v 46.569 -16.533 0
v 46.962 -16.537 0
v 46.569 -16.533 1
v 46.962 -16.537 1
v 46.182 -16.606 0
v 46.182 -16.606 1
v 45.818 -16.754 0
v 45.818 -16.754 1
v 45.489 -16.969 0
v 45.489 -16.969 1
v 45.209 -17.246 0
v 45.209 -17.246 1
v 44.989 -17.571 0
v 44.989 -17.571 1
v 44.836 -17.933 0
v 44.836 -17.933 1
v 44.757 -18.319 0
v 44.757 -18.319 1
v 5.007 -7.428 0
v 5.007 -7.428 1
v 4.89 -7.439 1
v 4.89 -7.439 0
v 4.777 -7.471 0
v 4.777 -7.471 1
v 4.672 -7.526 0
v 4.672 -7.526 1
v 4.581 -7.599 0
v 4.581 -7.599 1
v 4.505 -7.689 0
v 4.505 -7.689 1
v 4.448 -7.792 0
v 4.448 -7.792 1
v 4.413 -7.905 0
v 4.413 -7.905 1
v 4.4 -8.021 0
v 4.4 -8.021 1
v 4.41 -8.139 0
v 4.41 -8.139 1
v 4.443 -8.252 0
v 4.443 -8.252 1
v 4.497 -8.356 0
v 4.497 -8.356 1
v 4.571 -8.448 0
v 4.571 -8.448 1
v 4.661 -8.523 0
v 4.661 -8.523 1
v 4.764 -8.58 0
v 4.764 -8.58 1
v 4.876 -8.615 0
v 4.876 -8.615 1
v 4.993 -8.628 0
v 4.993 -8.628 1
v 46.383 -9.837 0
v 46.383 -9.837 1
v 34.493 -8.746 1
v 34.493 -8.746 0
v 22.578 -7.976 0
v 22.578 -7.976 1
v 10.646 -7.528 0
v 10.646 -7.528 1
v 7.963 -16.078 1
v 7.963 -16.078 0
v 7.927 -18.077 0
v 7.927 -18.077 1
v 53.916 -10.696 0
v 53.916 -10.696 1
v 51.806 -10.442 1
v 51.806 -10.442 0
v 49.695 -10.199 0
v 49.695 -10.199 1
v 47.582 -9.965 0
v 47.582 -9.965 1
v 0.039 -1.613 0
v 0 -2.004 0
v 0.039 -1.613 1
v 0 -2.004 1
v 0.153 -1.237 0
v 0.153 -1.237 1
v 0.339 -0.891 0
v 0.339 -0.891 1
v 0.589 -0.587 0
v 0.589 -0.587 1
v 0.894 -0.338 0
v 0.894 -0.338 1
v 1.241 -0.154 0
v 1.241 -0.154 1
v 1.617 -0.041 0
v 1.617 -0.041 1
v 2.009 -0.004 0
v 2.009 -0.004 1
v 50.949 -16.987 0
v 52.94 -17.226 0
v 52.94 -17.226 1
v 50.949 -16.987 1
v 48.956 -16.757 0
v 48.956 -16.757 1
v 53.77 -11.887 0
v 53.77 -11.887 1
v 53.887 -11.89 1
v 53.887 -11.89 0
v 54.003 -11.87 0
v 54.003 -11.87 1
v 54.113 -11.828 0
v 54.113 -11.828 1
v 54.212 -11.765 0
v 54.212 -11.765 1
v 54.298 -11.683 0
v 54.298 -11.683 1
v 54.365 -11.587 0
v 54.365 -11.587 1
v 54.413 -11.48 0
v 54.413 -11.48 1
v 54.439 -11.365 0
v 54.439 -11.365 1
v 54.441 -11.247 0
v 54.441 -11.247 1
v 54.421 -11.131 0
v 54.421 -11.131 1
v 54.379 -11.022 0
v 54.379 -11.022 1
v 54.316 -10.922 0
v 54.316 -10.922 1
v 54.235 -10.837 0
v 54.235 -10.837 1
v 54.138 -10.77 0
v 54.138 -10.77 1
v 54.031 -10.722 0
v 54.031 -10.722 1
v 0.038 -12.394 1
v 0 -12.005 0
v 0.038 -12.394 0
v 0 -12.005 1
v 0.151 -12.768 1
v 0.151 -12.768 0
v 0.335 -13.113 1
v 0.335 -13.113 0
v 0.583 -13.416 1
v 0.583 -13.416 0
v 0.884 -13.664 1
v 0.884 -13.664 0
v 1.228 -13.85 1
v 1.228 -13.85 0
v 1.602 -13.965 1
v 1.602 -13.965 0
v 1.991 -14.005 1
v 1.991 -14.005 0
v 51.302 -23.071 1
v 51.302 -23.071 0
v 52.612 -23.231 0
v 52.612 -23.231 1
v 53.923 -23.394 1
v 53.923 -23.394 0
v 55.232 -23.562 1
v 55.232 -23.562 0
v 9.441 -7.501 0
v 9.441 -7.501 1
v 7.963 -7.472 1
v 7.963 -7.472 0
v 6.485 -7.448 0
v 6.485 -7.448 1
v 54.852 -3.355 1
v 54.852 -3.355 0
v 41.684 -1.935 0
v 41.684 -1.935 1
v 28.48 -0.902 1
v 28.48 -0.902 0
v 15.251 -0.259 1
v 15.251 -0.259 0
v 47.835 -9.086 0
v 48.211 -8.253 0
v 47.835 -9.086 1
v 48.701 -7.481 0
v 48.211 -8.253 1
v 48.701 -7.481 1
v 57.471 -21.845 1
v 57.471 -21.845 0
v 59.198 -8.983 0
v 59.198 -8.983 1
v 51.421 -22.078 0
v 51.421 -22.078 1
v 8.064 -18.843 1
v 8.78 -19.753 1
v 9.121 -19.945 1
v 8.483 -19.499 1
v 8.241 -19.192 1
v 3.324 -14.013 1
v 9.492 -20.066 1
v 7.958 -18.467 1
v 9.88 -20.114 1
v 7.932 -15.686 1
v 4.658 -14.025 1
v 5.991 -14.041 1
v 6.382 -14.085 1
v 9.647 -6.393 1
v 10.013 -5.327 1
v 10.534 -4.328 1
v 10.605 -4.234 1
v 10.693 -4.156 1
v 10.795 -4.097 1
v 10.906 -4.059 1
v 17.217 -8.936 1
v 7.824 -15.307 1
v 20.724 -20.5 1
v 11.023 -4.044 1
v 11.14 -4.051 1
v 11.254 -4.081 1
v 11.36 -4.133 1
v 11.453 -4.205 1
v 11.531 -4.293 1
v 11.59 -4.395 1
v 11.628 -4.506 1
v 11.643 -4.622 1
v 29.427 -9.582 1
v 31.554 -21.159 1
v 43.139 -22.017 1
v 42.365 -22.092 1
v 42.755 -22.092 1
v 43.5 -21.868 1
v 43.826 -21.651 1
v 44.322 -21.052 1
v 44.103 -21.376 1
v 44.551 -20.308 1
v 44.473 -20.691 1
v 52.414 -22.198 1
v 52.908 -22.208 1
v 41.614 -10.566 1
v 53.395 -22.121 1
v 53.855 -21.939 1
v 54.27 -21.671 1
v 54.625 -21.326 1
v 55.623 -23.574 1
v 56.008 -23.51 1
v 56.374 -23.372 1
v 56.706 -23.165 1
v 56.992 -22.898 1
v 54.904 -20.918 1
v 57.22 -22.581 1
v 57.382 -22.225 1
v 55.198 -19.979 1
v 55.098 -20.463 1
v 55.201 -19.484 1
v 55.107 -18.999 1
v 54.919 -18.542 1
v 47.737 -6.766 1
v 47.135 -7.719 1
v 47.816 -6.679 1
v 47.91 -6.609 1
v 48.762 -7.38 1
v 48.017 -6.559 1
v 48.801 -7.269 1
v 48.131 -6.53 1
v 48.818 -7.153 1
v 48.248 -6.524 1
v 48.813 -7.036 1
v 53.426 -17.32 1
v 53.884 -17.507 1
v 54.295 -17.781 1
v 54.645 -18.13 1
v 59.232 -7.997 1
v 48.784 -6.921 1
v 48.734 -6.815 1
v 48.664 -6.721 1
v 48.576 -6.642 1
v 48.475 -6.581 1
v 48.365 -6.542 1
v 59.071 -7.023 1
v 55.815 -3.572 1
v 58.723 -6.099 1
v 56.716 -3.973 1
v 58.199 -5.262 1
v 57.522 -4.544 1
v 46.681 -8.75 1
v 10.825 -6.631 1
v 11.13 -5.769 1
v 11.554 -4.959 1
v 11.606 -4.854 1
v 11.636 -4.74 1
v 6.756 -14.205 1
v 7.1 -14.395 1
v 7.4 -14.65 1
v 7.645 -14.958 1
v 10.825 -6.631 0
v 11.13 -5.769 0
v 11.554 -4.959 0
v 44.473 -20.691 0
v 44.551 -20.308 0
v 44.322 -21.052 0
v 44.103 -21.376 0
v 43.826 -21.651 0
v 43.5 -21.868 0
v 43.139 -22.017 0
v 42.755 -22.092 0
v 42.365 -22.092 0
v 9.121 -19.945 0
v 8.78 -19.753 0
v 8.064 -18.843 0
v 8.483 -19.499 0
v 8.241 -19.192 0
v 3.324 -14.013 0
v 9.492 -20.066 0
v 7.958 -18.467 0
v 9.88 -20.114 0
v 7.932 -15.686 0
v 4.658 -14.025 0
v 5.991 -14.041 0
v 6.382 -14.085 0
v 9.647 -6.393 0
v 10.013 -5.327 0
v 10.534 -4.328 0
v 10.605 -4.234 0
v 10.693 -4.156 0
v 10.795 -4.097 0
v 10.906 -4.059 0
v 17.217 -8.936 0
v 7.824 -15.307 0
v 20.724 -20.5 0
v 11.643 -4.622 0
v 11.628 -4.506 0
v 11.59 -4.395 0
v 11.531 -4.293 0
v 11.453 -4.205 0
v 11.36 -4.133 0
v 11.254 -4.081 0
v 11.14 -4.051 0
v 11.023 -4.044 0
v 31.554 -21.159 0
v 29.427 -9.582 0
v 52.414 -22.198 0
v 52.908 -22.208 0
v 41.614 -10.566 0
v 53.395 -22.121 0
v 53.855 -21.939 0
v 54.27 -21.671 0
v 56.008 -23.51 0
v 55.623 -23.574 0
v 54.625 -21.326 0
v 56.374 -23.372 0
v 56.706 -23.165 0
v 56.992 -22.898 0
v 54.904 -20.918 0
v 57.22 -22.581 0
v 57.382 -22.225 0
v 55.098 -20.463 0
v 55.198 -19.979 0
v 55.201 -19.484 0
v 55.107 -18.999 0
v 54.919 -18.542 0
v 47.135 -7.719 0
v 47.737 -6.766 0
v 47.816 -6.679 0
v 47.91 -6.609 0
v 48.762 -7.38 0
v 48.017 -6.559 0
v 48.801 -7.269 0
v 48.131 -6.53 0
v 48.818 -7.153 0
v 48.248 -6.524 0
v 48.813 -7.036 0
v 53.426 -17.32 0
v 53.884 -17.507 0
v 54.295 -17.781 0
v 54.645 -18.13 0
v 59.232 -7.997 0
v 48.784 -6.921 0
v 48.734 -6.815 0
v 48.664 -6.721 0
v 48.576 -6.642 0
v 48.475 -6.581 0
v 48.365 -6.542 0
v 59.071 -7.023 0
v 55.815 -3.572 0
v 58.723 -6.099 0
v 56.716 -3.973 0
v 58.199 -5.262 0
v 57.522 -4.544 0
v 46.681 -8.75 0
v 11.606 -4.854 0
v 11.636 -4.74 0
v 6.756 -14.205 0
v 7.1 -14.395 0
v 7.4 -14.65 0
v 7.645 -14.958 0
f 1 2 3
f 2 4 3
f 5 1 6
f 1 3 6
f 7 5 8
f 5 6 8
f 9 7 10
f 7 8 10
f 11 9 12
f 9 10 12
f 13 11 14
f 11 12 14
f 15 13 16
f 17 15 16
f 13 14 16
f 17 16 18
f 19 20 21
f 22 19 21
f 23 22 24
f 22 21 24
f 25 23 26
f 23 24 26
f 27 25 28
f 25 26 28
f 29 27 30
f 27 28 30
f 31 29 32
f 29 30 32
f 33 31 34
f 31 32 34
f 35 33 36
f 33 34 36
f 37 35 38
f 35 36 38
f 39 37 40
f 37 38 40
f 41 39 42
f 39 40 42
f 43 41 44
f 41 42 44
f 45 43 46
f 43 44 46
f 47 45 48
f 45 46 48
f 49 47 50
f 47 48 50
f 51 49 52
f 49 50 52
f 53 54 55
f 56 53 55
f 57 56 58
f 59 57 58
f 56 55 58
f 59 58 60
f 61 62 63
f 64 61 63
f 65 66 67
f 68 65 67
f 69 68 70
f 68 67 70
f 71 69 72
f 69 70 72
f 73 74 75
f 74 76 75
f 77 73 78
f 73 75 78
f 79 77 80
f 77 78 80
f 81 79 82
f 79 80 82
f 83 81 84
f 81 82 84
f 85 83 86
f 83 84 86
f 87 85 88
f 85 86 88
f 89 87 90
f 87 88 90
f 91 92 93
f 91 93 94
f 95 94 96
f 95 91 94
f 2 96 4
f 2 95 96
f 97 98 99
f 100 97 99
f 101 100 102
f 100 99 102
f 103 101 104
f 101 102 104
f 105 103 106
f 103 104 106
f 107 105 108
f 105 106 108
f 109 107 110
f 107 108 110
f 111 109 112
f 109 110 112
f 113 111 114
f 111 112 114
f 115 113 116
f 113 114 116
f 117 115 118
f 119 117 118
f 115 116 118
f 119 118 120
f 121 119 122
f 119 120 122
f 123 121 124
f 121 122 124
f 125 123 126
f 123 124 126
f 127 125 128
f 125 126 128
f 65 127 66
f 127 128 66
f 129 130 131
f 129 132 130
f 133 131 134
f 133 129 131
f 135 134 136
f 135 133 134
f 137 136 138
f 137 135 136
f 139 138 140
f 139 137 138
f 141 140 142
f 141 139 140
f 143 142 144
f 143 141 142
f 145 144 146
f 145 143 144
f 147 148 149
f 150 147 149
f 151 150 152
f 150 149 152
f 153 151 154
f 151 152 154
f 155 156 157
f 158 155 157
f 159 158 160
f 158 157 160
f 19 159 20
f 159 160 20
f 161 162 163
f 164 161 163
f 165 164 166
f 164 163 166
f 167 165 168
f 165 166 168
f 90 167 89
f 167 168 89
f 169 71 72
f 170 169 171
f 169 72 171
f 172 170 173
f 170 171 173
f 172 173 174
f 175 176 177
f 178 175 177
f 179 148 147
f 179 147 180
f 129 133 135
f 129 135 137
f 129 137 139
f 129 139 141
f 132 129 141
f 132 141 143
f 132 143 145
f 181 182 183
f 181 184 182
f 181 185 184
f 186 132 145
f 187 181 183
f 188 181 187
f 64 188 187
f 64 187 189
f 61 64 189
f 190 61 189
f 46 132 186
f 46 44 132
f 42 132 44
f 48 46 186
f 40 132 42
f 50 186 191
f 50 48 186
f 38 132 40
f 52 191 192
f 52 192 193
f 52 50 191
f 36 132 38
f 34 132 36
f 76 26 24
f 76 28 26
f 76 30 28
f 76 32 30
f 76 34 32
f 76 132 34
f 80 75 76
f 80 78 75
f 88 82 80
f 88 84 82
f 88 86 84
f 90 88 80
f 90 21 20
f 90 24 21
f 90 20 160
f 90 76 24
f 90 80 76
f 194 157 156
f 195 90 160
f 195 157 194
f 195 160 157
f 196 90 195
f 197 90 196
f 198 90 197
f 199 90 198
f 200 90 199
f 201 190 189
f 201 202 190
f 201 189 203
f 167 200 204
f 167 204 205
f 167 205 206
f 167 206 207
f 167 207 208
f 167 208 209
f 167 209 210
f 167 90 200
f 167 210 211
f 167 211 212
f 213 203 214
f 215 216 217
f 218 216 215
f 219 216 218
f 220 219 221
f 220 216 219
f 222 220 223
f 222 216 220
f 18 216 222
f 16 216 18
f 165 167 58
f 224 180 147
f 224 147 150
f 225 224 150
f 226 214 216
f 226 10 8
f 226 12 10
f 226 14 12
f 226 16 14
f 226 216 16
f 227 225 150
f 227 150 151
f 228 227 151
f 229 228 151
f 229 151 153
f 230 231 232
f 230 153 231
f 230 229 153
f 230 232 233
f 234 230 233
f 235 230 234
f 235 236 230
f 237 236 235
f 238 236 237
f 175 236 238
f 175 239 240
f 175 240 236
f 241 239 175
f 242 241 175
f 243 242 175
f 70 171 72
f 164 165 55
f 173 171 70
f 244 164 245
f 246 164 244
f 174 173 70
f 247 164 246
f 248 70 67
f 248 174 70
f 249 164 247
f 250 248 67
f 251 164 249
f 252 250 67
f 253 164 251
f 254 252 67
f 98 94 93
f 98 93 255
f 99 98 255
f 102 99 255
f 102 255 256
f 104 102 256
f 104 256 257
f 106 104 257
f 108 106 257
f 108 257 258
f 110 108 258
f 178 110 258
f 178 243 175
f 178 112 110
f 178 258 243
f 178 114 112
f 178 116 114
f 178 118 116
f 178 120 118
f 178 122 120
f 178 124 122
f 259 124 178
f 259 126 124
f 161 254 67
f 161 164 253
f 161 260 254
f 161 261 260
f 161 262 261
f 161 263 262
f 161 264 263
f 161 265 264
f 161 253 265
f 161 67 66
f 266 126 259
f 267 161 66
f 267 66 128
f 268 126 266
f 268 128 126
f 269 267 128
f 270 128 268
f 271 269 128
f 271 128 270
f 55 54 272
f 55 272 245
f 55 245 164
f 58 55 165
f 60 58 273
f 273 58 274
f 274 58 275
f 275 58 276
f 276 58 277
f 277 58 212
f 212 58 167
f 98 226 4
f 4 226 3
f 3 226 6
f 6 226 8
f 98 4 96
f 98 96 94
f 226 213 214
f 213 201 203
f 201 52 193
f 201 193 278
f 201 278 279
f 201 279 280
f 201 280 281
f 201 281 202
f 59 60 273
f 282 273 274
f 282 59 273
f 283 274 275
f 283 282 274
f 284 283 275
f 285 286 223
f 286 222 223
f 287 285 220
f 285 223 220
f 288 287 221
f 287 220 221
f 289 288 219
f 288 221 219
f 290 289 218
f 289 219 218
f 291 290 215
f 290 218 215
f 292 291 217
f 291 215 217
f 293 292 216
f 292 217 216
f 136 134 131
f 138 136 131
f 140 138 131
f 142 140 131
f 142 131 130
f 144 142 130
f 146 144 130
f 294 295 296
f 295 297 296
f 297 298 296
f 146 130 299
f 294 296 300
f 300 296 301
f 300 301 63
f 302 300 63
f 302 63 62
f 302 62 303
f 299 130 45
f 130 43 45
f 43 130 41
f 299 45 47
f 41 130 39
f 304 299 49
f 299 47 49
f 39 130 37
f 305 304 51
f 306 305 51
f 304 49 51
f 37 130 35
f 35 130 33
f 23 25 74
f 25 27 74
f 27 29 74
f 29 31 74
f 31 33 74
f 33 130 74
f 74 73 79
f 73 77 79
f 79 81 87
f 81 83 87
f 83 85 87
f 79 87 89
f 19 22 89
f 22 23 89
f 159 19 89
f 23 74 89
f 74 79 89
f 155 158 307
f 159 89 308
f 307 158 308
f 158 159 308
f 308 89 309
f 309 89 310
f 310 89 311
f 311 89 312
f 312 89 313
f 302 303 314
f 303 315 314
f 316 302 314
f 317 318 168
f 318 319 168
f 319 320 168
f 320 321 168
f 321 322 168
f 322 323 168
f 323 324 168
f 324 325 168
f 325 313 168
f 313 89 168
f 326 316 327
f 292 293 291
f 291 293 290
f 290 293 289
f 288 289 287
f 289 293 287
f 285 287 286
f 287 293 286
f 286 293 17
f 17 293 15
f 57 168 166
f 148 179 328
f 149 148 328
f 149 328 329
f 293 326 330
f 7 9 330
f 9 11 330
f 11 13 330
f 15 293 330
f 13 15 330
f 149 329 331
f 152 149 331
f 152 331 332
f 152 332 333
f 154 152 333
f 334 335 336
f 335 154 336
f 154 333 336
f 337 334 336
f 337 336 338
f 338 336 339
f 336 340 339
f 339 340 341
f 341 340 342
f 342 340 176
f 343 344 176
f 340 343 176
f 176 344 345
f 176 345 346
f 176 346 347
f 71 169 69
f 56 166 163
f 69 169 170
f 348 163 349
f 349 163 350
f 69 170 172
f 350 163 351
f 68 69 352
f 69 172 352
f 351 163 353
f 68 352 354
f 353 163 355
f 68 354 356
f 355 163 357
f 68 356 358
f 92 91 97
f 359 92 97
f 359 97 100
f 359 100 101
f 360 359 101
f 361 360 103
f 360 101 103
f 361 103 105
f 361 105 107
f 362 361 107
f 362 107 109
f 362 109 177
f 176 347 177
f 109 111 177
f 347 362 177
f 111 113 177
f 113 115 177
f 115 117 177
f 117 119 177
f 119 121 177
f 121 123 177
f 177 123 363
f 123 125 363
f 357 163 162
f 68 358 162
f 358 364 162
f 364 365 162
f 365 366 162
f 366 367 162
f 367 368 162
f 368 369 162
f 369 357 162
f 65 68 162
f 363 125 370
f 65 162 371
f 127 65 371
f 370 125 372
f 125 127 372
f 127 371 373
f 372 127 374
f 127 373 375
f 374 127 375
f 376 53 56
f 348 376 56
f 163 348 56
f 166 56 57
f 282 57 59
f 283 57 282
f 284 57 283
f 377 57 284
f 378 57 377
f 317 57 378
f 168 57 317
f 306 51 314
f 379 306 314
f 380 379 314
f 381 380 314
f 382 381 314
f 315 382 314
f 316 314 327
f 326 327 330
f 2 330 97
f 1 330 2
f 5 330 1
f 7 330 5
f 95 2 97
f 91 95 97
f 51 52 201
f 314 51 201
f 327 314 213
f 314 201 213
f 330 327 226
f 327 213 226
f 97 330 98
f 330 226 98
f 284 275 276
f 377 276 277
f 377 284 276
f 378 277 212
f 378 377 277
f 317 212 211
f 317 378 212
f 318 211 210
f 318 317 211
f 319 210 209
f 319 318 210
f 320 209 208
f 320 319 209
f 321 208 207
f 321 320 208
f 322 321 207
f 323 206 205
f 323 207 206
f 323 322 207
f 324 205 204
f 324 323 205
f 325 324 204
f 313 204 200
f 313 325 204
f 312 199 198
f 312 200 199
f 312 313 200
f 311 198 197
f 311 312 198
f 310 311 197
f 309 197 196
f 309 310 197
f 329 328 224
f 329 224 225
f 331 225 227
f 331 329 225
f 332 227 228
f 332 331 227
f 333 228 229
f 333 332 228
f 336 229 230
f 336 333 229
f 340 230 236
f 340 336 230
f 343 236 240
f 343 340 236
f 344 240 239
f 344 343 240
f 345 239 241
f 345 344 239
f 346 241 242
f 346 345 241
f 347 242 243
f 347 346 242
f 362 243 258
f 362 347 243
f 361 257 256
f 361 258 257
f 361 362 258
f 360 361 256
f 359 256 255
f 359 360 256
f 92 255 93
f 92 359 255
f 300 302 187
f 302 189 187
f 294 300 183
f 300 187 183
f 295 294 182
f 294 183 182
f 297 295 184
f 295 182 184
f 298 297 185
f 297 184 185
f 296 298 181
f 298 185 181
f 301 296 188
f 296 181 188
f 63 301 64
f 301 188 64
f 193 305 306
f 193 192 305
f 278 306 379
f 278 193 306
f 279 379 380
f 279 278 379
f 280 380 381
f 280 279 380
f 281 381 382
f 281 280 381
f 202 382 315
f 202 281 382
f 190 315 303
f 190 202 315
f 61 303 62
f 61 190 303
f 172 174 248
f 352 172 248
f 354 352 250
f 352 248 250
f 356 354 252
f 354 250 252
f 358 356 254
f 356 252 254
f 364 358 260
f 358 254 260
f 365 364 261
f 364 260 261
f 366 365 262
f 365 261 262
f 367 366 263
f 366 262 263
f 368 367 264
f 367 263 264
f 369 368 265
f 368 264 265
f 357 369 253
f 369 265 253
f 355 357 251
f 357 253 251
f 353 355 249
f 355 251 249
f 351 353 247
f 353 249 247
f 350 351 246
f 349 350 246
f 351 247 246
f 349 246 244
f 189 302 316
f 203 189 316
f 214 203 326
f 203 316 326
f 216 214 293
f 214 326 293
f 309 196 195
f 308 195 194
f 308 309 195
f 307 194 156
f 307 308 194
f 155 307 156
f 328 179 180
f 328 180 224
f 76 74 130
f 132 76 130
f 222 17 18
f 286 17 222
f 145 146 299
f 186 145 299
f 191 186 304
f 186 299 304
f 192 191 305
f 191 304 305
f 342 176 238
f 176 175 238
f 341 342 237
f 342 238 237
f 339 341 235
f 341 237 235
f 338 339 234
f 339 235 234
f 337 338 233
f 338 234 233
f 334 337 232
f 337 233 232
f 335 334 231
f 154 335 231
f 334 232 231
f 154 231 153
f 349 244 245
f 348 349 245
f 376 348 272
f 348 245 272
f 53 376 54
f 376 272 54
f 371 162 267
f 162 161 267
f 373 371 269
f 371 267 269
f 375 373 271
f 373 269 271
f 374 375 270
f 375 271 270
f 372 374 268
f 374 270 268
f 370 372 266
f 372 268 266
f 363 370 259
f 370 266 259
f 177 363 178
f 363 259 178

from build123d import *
from OCP.BRepFilletAPI import BRepFilletAPI_MakeFillet

# Parameters (mm, degrees)
P_IDAT_VYSUNUT_M1_DEPTH       = 1
ODEBRAT_VYSUNUT_M1_DEPTH      = 65.439881064
ODEBRAT_VYSUNUT_M3_DEPTH      = 65.439881064
ODEBRAT_VYSUNUT_M3_DEPTH_BACK = 65.439881064
ODEBRAT_VYSUNUT_M4_DEPTH      = 65.439881064
ODEBRAT_VYSUNUT_M4_DEPTH_BACK = 65.439881064
ZAOBLIT1_R1                   = 2
ZAOBLIT1_R2                   = 5
ODEBRAT_VYSUNUT_M5_DEPTH      = 64.769631591
ODEBRAT_VYSUNUT_M8_DEPTH      = 64.769631591


with BuildPart() as part:
    # Skica1 → Přidat vysunutím1 (new body)
    with BuildSketch(Plane.XY):
        with BuildLine():
            Line((0, 0), (0, -20))
            ThreePointArc((0, -20), (28.666666667, -20.95661965), (57.205784047, -23.822222222))
            Line((57.205784047, -23.822222222), (59.866518188, -4))
            ThreePointArc((59.866518188, -4), (30, -1.001113587), (0, 0))
        make_face()
    extrude(amount=P_IDAT_VYSUNUT_M1_DEPTH)

    # Skica2 → Odebrat vysunutím1 (cut, through all)
    with BuildSketch(Plane.XY.offset(1)):
        with BuildLine():
            ThreePointArc((5.00678733, -7.428319839), (4.400038391, -8.021494117), (4.99321267, -8.628243057))
            ThreePointArc((4.99321267, -8.628243057), (29.426706516, -9.581983857), (53.769895868, -11.887276722))
            ThreePointArc((53.769895868, -11.887276722), (54.438517462, -11.36483518), (53.916075921, -10.696213586))
            ThreePointArc((53.916075921, -10.696213586), (29.506706624, -8.3846535), (5.00678733, -7.428319839))
        make_face()
    extrude(amount=-ODEBRAT_VYSUNUT_M1_DEPTH, mode=Mode.SUBTRACT)

    # Skica4 → Odebrat vysunutím3 (cut, two sides: drawn at the far end of the back side and taken through both)
    with BuildSketch(Plane.XY.offset(1).offset(-ODEBRAT_VYSUNUT_M3_DEPTH_BACK)):
        with BuildLine():
            Line((-132.963409192, -14), (0, -14))
            ThreePointArc((0, -14), (4.000168361, -14.018350555), (8, -14.073400674))
            Line((8, -14.073400674), (7.889908257, -20.072390573))
            Line((7.889908257, -20.072390573), (5.450212675, -153.013415352))
            Line((5.450212675, -153.013415352), (-182.994540511, -340.645096397))
            Line((-182.994540511, -340.645096397), (-321.408162378, -201.631681045))
            Line((-321.408162378, -201.631681045), (-132.963409192, -14))
        make_face()
    extrude(amount=ODEBRAT_VYSUNUT_M3_DEPTH + ODEBRAT_VYSUNUT_M3_DEPTH_BACK, mode=Mode.SUBTRACT)

    # Skica5 → Odebrat vysunutím4 (cut, two sides: drawn at the far end of the back side and taken through both)
    with BuildSketch(Plane.XY.offset(1).offset(-ODEBRAT_VYSUNUT_M4_DEPTH_BACK)):
        with BuildLine():
            Line((36.686520611, -144.697920219), (51.301744348, -23.071281094))
            Line((51.301744348, -23.071281094), (51.42105073, -22.078423608))
            Line((51.42105073, -22.078423608), (52.413908216, -22.19772999))
            ThreePointArc((52.413908216, -22.19772999), (55.198271053, -19.978877549), (52.940438573, -17.226029013))
            ThreePointArc((52.940438573, -17.226029013), (48.954265765, -16.757019834), (44.963944364, -16.324725506))
            Line((44.963944364, -16.324725506), (44.345174487, -22.292733871))
            Line((44.345174487, -22.292733871), (31.711790282, -144.141171338))
            Line((31.711790282, -144.141171338), (4.462279657, -387.624313691))
            Line((4.462279657, -387.624313691), (9.437009987, -388.181062571))
            Line((9.437009987, -388.181062571), (36.686520611, -144.697920219))
        make_face()
    extrude(amount=ODEBRAT_VYSUNUT_M4_DEPTH + ODEBRAT_VYSUNUT_M4_DEPTH_BACK, mode=Mode.SUBTRACT)

    # Zaoblit1: one fillet with a radius per group of edges: ONE call of the kernel's fillet builder (fillet() takes one radius for all edges)
    zaoblit1_edges_1 = [part.edges().sort_by_distance(p)[0] for p in [
        (0, 0, 0.5),
        (57.205784047, -23.822222222, 0.5),
        (44.345174487, -22.292733871, 0.5),
        (0, -14, 0.5),
        (7.889908257, -20.072390573, 0.5),
        (8, -14.073400674, 0.5),
        (44.963944364, -16.324725506, 0.5),
    ]]
    zaoblit1_edges_2 = [part.edges().sort_by_distance(p)[0] for p in [
        (59.866518188, -4, 0.5),
    ]]
    zaoblit1 = BRepFilletAPI_MakeFillet(part.part.solid().wrapped)
    for e in zaoblit1_edges_1:
        zaoblit1.Add(ZAOBLIT1_R1, e.wrapped)
    for e in zaoblit1_edges_2:
        zaoblit1.Add(ZAOBLIT1_R2, e.wrapped)
    add(Compound.cast(zaoblit1.Shape()), mode=Mode.REPLACE)

    # Skica6 → Odebrat vysunutím5 (cut, through all)
    with BuildSketch(Plane.XY.offset(1)):
        with BuildLine():
            ThreePointArc((47.737088512, -6.766480836), (46.77391733, -8.500998009), (46.292491489, -10.425699987))
            ThreePointArc((46.292491489, -10.425699987), (46.820211166, -11.090163638), (47.484674816, -10.562443961))
            ThreePointArc((47.484674816, -10.562443961), (47.890086051, -8.941642295), (48.701177572, -7.480996255))
            ThreePointArc((48.701177572, -7.480996255), (48.576390751, -6.641694015), (47.737088512, -6.766480836))
        make_face()
    extrude(amount=-ODEBRAT_VYSUNUT_M5_DEPTH, mode=Mode.SUBTRACT)

    # Skica7 → Odebrat vysunutím8 (cut, through all)
    with BuildSketch(Plane.XY):
        with BuildLine():
            ThreePointArc((10.533609812, -4.327670598), (9.718743083, -6.136604196), (9.399828731, -8.094802905))
            ThreePointArc((9.399828731, -8.094802905), (9.981225335, -8.712846584), (10.599269014, -8.13144998))
            ThreePointArc((10.599269014, -8.13144998), (10.867828468, -6.482440541), (11.55403203, -4.959128038))
            ThreePointArc((11.55403203, -4.959128038), (11.359549641, -4.133188209), (10.533609812, -4.327670598))
        make_face()
    extrude(amount=ODEBRAT_VYSUNUT_M8_DEPTH, mode=Mode.SUBTRACT)


solid = part.part
